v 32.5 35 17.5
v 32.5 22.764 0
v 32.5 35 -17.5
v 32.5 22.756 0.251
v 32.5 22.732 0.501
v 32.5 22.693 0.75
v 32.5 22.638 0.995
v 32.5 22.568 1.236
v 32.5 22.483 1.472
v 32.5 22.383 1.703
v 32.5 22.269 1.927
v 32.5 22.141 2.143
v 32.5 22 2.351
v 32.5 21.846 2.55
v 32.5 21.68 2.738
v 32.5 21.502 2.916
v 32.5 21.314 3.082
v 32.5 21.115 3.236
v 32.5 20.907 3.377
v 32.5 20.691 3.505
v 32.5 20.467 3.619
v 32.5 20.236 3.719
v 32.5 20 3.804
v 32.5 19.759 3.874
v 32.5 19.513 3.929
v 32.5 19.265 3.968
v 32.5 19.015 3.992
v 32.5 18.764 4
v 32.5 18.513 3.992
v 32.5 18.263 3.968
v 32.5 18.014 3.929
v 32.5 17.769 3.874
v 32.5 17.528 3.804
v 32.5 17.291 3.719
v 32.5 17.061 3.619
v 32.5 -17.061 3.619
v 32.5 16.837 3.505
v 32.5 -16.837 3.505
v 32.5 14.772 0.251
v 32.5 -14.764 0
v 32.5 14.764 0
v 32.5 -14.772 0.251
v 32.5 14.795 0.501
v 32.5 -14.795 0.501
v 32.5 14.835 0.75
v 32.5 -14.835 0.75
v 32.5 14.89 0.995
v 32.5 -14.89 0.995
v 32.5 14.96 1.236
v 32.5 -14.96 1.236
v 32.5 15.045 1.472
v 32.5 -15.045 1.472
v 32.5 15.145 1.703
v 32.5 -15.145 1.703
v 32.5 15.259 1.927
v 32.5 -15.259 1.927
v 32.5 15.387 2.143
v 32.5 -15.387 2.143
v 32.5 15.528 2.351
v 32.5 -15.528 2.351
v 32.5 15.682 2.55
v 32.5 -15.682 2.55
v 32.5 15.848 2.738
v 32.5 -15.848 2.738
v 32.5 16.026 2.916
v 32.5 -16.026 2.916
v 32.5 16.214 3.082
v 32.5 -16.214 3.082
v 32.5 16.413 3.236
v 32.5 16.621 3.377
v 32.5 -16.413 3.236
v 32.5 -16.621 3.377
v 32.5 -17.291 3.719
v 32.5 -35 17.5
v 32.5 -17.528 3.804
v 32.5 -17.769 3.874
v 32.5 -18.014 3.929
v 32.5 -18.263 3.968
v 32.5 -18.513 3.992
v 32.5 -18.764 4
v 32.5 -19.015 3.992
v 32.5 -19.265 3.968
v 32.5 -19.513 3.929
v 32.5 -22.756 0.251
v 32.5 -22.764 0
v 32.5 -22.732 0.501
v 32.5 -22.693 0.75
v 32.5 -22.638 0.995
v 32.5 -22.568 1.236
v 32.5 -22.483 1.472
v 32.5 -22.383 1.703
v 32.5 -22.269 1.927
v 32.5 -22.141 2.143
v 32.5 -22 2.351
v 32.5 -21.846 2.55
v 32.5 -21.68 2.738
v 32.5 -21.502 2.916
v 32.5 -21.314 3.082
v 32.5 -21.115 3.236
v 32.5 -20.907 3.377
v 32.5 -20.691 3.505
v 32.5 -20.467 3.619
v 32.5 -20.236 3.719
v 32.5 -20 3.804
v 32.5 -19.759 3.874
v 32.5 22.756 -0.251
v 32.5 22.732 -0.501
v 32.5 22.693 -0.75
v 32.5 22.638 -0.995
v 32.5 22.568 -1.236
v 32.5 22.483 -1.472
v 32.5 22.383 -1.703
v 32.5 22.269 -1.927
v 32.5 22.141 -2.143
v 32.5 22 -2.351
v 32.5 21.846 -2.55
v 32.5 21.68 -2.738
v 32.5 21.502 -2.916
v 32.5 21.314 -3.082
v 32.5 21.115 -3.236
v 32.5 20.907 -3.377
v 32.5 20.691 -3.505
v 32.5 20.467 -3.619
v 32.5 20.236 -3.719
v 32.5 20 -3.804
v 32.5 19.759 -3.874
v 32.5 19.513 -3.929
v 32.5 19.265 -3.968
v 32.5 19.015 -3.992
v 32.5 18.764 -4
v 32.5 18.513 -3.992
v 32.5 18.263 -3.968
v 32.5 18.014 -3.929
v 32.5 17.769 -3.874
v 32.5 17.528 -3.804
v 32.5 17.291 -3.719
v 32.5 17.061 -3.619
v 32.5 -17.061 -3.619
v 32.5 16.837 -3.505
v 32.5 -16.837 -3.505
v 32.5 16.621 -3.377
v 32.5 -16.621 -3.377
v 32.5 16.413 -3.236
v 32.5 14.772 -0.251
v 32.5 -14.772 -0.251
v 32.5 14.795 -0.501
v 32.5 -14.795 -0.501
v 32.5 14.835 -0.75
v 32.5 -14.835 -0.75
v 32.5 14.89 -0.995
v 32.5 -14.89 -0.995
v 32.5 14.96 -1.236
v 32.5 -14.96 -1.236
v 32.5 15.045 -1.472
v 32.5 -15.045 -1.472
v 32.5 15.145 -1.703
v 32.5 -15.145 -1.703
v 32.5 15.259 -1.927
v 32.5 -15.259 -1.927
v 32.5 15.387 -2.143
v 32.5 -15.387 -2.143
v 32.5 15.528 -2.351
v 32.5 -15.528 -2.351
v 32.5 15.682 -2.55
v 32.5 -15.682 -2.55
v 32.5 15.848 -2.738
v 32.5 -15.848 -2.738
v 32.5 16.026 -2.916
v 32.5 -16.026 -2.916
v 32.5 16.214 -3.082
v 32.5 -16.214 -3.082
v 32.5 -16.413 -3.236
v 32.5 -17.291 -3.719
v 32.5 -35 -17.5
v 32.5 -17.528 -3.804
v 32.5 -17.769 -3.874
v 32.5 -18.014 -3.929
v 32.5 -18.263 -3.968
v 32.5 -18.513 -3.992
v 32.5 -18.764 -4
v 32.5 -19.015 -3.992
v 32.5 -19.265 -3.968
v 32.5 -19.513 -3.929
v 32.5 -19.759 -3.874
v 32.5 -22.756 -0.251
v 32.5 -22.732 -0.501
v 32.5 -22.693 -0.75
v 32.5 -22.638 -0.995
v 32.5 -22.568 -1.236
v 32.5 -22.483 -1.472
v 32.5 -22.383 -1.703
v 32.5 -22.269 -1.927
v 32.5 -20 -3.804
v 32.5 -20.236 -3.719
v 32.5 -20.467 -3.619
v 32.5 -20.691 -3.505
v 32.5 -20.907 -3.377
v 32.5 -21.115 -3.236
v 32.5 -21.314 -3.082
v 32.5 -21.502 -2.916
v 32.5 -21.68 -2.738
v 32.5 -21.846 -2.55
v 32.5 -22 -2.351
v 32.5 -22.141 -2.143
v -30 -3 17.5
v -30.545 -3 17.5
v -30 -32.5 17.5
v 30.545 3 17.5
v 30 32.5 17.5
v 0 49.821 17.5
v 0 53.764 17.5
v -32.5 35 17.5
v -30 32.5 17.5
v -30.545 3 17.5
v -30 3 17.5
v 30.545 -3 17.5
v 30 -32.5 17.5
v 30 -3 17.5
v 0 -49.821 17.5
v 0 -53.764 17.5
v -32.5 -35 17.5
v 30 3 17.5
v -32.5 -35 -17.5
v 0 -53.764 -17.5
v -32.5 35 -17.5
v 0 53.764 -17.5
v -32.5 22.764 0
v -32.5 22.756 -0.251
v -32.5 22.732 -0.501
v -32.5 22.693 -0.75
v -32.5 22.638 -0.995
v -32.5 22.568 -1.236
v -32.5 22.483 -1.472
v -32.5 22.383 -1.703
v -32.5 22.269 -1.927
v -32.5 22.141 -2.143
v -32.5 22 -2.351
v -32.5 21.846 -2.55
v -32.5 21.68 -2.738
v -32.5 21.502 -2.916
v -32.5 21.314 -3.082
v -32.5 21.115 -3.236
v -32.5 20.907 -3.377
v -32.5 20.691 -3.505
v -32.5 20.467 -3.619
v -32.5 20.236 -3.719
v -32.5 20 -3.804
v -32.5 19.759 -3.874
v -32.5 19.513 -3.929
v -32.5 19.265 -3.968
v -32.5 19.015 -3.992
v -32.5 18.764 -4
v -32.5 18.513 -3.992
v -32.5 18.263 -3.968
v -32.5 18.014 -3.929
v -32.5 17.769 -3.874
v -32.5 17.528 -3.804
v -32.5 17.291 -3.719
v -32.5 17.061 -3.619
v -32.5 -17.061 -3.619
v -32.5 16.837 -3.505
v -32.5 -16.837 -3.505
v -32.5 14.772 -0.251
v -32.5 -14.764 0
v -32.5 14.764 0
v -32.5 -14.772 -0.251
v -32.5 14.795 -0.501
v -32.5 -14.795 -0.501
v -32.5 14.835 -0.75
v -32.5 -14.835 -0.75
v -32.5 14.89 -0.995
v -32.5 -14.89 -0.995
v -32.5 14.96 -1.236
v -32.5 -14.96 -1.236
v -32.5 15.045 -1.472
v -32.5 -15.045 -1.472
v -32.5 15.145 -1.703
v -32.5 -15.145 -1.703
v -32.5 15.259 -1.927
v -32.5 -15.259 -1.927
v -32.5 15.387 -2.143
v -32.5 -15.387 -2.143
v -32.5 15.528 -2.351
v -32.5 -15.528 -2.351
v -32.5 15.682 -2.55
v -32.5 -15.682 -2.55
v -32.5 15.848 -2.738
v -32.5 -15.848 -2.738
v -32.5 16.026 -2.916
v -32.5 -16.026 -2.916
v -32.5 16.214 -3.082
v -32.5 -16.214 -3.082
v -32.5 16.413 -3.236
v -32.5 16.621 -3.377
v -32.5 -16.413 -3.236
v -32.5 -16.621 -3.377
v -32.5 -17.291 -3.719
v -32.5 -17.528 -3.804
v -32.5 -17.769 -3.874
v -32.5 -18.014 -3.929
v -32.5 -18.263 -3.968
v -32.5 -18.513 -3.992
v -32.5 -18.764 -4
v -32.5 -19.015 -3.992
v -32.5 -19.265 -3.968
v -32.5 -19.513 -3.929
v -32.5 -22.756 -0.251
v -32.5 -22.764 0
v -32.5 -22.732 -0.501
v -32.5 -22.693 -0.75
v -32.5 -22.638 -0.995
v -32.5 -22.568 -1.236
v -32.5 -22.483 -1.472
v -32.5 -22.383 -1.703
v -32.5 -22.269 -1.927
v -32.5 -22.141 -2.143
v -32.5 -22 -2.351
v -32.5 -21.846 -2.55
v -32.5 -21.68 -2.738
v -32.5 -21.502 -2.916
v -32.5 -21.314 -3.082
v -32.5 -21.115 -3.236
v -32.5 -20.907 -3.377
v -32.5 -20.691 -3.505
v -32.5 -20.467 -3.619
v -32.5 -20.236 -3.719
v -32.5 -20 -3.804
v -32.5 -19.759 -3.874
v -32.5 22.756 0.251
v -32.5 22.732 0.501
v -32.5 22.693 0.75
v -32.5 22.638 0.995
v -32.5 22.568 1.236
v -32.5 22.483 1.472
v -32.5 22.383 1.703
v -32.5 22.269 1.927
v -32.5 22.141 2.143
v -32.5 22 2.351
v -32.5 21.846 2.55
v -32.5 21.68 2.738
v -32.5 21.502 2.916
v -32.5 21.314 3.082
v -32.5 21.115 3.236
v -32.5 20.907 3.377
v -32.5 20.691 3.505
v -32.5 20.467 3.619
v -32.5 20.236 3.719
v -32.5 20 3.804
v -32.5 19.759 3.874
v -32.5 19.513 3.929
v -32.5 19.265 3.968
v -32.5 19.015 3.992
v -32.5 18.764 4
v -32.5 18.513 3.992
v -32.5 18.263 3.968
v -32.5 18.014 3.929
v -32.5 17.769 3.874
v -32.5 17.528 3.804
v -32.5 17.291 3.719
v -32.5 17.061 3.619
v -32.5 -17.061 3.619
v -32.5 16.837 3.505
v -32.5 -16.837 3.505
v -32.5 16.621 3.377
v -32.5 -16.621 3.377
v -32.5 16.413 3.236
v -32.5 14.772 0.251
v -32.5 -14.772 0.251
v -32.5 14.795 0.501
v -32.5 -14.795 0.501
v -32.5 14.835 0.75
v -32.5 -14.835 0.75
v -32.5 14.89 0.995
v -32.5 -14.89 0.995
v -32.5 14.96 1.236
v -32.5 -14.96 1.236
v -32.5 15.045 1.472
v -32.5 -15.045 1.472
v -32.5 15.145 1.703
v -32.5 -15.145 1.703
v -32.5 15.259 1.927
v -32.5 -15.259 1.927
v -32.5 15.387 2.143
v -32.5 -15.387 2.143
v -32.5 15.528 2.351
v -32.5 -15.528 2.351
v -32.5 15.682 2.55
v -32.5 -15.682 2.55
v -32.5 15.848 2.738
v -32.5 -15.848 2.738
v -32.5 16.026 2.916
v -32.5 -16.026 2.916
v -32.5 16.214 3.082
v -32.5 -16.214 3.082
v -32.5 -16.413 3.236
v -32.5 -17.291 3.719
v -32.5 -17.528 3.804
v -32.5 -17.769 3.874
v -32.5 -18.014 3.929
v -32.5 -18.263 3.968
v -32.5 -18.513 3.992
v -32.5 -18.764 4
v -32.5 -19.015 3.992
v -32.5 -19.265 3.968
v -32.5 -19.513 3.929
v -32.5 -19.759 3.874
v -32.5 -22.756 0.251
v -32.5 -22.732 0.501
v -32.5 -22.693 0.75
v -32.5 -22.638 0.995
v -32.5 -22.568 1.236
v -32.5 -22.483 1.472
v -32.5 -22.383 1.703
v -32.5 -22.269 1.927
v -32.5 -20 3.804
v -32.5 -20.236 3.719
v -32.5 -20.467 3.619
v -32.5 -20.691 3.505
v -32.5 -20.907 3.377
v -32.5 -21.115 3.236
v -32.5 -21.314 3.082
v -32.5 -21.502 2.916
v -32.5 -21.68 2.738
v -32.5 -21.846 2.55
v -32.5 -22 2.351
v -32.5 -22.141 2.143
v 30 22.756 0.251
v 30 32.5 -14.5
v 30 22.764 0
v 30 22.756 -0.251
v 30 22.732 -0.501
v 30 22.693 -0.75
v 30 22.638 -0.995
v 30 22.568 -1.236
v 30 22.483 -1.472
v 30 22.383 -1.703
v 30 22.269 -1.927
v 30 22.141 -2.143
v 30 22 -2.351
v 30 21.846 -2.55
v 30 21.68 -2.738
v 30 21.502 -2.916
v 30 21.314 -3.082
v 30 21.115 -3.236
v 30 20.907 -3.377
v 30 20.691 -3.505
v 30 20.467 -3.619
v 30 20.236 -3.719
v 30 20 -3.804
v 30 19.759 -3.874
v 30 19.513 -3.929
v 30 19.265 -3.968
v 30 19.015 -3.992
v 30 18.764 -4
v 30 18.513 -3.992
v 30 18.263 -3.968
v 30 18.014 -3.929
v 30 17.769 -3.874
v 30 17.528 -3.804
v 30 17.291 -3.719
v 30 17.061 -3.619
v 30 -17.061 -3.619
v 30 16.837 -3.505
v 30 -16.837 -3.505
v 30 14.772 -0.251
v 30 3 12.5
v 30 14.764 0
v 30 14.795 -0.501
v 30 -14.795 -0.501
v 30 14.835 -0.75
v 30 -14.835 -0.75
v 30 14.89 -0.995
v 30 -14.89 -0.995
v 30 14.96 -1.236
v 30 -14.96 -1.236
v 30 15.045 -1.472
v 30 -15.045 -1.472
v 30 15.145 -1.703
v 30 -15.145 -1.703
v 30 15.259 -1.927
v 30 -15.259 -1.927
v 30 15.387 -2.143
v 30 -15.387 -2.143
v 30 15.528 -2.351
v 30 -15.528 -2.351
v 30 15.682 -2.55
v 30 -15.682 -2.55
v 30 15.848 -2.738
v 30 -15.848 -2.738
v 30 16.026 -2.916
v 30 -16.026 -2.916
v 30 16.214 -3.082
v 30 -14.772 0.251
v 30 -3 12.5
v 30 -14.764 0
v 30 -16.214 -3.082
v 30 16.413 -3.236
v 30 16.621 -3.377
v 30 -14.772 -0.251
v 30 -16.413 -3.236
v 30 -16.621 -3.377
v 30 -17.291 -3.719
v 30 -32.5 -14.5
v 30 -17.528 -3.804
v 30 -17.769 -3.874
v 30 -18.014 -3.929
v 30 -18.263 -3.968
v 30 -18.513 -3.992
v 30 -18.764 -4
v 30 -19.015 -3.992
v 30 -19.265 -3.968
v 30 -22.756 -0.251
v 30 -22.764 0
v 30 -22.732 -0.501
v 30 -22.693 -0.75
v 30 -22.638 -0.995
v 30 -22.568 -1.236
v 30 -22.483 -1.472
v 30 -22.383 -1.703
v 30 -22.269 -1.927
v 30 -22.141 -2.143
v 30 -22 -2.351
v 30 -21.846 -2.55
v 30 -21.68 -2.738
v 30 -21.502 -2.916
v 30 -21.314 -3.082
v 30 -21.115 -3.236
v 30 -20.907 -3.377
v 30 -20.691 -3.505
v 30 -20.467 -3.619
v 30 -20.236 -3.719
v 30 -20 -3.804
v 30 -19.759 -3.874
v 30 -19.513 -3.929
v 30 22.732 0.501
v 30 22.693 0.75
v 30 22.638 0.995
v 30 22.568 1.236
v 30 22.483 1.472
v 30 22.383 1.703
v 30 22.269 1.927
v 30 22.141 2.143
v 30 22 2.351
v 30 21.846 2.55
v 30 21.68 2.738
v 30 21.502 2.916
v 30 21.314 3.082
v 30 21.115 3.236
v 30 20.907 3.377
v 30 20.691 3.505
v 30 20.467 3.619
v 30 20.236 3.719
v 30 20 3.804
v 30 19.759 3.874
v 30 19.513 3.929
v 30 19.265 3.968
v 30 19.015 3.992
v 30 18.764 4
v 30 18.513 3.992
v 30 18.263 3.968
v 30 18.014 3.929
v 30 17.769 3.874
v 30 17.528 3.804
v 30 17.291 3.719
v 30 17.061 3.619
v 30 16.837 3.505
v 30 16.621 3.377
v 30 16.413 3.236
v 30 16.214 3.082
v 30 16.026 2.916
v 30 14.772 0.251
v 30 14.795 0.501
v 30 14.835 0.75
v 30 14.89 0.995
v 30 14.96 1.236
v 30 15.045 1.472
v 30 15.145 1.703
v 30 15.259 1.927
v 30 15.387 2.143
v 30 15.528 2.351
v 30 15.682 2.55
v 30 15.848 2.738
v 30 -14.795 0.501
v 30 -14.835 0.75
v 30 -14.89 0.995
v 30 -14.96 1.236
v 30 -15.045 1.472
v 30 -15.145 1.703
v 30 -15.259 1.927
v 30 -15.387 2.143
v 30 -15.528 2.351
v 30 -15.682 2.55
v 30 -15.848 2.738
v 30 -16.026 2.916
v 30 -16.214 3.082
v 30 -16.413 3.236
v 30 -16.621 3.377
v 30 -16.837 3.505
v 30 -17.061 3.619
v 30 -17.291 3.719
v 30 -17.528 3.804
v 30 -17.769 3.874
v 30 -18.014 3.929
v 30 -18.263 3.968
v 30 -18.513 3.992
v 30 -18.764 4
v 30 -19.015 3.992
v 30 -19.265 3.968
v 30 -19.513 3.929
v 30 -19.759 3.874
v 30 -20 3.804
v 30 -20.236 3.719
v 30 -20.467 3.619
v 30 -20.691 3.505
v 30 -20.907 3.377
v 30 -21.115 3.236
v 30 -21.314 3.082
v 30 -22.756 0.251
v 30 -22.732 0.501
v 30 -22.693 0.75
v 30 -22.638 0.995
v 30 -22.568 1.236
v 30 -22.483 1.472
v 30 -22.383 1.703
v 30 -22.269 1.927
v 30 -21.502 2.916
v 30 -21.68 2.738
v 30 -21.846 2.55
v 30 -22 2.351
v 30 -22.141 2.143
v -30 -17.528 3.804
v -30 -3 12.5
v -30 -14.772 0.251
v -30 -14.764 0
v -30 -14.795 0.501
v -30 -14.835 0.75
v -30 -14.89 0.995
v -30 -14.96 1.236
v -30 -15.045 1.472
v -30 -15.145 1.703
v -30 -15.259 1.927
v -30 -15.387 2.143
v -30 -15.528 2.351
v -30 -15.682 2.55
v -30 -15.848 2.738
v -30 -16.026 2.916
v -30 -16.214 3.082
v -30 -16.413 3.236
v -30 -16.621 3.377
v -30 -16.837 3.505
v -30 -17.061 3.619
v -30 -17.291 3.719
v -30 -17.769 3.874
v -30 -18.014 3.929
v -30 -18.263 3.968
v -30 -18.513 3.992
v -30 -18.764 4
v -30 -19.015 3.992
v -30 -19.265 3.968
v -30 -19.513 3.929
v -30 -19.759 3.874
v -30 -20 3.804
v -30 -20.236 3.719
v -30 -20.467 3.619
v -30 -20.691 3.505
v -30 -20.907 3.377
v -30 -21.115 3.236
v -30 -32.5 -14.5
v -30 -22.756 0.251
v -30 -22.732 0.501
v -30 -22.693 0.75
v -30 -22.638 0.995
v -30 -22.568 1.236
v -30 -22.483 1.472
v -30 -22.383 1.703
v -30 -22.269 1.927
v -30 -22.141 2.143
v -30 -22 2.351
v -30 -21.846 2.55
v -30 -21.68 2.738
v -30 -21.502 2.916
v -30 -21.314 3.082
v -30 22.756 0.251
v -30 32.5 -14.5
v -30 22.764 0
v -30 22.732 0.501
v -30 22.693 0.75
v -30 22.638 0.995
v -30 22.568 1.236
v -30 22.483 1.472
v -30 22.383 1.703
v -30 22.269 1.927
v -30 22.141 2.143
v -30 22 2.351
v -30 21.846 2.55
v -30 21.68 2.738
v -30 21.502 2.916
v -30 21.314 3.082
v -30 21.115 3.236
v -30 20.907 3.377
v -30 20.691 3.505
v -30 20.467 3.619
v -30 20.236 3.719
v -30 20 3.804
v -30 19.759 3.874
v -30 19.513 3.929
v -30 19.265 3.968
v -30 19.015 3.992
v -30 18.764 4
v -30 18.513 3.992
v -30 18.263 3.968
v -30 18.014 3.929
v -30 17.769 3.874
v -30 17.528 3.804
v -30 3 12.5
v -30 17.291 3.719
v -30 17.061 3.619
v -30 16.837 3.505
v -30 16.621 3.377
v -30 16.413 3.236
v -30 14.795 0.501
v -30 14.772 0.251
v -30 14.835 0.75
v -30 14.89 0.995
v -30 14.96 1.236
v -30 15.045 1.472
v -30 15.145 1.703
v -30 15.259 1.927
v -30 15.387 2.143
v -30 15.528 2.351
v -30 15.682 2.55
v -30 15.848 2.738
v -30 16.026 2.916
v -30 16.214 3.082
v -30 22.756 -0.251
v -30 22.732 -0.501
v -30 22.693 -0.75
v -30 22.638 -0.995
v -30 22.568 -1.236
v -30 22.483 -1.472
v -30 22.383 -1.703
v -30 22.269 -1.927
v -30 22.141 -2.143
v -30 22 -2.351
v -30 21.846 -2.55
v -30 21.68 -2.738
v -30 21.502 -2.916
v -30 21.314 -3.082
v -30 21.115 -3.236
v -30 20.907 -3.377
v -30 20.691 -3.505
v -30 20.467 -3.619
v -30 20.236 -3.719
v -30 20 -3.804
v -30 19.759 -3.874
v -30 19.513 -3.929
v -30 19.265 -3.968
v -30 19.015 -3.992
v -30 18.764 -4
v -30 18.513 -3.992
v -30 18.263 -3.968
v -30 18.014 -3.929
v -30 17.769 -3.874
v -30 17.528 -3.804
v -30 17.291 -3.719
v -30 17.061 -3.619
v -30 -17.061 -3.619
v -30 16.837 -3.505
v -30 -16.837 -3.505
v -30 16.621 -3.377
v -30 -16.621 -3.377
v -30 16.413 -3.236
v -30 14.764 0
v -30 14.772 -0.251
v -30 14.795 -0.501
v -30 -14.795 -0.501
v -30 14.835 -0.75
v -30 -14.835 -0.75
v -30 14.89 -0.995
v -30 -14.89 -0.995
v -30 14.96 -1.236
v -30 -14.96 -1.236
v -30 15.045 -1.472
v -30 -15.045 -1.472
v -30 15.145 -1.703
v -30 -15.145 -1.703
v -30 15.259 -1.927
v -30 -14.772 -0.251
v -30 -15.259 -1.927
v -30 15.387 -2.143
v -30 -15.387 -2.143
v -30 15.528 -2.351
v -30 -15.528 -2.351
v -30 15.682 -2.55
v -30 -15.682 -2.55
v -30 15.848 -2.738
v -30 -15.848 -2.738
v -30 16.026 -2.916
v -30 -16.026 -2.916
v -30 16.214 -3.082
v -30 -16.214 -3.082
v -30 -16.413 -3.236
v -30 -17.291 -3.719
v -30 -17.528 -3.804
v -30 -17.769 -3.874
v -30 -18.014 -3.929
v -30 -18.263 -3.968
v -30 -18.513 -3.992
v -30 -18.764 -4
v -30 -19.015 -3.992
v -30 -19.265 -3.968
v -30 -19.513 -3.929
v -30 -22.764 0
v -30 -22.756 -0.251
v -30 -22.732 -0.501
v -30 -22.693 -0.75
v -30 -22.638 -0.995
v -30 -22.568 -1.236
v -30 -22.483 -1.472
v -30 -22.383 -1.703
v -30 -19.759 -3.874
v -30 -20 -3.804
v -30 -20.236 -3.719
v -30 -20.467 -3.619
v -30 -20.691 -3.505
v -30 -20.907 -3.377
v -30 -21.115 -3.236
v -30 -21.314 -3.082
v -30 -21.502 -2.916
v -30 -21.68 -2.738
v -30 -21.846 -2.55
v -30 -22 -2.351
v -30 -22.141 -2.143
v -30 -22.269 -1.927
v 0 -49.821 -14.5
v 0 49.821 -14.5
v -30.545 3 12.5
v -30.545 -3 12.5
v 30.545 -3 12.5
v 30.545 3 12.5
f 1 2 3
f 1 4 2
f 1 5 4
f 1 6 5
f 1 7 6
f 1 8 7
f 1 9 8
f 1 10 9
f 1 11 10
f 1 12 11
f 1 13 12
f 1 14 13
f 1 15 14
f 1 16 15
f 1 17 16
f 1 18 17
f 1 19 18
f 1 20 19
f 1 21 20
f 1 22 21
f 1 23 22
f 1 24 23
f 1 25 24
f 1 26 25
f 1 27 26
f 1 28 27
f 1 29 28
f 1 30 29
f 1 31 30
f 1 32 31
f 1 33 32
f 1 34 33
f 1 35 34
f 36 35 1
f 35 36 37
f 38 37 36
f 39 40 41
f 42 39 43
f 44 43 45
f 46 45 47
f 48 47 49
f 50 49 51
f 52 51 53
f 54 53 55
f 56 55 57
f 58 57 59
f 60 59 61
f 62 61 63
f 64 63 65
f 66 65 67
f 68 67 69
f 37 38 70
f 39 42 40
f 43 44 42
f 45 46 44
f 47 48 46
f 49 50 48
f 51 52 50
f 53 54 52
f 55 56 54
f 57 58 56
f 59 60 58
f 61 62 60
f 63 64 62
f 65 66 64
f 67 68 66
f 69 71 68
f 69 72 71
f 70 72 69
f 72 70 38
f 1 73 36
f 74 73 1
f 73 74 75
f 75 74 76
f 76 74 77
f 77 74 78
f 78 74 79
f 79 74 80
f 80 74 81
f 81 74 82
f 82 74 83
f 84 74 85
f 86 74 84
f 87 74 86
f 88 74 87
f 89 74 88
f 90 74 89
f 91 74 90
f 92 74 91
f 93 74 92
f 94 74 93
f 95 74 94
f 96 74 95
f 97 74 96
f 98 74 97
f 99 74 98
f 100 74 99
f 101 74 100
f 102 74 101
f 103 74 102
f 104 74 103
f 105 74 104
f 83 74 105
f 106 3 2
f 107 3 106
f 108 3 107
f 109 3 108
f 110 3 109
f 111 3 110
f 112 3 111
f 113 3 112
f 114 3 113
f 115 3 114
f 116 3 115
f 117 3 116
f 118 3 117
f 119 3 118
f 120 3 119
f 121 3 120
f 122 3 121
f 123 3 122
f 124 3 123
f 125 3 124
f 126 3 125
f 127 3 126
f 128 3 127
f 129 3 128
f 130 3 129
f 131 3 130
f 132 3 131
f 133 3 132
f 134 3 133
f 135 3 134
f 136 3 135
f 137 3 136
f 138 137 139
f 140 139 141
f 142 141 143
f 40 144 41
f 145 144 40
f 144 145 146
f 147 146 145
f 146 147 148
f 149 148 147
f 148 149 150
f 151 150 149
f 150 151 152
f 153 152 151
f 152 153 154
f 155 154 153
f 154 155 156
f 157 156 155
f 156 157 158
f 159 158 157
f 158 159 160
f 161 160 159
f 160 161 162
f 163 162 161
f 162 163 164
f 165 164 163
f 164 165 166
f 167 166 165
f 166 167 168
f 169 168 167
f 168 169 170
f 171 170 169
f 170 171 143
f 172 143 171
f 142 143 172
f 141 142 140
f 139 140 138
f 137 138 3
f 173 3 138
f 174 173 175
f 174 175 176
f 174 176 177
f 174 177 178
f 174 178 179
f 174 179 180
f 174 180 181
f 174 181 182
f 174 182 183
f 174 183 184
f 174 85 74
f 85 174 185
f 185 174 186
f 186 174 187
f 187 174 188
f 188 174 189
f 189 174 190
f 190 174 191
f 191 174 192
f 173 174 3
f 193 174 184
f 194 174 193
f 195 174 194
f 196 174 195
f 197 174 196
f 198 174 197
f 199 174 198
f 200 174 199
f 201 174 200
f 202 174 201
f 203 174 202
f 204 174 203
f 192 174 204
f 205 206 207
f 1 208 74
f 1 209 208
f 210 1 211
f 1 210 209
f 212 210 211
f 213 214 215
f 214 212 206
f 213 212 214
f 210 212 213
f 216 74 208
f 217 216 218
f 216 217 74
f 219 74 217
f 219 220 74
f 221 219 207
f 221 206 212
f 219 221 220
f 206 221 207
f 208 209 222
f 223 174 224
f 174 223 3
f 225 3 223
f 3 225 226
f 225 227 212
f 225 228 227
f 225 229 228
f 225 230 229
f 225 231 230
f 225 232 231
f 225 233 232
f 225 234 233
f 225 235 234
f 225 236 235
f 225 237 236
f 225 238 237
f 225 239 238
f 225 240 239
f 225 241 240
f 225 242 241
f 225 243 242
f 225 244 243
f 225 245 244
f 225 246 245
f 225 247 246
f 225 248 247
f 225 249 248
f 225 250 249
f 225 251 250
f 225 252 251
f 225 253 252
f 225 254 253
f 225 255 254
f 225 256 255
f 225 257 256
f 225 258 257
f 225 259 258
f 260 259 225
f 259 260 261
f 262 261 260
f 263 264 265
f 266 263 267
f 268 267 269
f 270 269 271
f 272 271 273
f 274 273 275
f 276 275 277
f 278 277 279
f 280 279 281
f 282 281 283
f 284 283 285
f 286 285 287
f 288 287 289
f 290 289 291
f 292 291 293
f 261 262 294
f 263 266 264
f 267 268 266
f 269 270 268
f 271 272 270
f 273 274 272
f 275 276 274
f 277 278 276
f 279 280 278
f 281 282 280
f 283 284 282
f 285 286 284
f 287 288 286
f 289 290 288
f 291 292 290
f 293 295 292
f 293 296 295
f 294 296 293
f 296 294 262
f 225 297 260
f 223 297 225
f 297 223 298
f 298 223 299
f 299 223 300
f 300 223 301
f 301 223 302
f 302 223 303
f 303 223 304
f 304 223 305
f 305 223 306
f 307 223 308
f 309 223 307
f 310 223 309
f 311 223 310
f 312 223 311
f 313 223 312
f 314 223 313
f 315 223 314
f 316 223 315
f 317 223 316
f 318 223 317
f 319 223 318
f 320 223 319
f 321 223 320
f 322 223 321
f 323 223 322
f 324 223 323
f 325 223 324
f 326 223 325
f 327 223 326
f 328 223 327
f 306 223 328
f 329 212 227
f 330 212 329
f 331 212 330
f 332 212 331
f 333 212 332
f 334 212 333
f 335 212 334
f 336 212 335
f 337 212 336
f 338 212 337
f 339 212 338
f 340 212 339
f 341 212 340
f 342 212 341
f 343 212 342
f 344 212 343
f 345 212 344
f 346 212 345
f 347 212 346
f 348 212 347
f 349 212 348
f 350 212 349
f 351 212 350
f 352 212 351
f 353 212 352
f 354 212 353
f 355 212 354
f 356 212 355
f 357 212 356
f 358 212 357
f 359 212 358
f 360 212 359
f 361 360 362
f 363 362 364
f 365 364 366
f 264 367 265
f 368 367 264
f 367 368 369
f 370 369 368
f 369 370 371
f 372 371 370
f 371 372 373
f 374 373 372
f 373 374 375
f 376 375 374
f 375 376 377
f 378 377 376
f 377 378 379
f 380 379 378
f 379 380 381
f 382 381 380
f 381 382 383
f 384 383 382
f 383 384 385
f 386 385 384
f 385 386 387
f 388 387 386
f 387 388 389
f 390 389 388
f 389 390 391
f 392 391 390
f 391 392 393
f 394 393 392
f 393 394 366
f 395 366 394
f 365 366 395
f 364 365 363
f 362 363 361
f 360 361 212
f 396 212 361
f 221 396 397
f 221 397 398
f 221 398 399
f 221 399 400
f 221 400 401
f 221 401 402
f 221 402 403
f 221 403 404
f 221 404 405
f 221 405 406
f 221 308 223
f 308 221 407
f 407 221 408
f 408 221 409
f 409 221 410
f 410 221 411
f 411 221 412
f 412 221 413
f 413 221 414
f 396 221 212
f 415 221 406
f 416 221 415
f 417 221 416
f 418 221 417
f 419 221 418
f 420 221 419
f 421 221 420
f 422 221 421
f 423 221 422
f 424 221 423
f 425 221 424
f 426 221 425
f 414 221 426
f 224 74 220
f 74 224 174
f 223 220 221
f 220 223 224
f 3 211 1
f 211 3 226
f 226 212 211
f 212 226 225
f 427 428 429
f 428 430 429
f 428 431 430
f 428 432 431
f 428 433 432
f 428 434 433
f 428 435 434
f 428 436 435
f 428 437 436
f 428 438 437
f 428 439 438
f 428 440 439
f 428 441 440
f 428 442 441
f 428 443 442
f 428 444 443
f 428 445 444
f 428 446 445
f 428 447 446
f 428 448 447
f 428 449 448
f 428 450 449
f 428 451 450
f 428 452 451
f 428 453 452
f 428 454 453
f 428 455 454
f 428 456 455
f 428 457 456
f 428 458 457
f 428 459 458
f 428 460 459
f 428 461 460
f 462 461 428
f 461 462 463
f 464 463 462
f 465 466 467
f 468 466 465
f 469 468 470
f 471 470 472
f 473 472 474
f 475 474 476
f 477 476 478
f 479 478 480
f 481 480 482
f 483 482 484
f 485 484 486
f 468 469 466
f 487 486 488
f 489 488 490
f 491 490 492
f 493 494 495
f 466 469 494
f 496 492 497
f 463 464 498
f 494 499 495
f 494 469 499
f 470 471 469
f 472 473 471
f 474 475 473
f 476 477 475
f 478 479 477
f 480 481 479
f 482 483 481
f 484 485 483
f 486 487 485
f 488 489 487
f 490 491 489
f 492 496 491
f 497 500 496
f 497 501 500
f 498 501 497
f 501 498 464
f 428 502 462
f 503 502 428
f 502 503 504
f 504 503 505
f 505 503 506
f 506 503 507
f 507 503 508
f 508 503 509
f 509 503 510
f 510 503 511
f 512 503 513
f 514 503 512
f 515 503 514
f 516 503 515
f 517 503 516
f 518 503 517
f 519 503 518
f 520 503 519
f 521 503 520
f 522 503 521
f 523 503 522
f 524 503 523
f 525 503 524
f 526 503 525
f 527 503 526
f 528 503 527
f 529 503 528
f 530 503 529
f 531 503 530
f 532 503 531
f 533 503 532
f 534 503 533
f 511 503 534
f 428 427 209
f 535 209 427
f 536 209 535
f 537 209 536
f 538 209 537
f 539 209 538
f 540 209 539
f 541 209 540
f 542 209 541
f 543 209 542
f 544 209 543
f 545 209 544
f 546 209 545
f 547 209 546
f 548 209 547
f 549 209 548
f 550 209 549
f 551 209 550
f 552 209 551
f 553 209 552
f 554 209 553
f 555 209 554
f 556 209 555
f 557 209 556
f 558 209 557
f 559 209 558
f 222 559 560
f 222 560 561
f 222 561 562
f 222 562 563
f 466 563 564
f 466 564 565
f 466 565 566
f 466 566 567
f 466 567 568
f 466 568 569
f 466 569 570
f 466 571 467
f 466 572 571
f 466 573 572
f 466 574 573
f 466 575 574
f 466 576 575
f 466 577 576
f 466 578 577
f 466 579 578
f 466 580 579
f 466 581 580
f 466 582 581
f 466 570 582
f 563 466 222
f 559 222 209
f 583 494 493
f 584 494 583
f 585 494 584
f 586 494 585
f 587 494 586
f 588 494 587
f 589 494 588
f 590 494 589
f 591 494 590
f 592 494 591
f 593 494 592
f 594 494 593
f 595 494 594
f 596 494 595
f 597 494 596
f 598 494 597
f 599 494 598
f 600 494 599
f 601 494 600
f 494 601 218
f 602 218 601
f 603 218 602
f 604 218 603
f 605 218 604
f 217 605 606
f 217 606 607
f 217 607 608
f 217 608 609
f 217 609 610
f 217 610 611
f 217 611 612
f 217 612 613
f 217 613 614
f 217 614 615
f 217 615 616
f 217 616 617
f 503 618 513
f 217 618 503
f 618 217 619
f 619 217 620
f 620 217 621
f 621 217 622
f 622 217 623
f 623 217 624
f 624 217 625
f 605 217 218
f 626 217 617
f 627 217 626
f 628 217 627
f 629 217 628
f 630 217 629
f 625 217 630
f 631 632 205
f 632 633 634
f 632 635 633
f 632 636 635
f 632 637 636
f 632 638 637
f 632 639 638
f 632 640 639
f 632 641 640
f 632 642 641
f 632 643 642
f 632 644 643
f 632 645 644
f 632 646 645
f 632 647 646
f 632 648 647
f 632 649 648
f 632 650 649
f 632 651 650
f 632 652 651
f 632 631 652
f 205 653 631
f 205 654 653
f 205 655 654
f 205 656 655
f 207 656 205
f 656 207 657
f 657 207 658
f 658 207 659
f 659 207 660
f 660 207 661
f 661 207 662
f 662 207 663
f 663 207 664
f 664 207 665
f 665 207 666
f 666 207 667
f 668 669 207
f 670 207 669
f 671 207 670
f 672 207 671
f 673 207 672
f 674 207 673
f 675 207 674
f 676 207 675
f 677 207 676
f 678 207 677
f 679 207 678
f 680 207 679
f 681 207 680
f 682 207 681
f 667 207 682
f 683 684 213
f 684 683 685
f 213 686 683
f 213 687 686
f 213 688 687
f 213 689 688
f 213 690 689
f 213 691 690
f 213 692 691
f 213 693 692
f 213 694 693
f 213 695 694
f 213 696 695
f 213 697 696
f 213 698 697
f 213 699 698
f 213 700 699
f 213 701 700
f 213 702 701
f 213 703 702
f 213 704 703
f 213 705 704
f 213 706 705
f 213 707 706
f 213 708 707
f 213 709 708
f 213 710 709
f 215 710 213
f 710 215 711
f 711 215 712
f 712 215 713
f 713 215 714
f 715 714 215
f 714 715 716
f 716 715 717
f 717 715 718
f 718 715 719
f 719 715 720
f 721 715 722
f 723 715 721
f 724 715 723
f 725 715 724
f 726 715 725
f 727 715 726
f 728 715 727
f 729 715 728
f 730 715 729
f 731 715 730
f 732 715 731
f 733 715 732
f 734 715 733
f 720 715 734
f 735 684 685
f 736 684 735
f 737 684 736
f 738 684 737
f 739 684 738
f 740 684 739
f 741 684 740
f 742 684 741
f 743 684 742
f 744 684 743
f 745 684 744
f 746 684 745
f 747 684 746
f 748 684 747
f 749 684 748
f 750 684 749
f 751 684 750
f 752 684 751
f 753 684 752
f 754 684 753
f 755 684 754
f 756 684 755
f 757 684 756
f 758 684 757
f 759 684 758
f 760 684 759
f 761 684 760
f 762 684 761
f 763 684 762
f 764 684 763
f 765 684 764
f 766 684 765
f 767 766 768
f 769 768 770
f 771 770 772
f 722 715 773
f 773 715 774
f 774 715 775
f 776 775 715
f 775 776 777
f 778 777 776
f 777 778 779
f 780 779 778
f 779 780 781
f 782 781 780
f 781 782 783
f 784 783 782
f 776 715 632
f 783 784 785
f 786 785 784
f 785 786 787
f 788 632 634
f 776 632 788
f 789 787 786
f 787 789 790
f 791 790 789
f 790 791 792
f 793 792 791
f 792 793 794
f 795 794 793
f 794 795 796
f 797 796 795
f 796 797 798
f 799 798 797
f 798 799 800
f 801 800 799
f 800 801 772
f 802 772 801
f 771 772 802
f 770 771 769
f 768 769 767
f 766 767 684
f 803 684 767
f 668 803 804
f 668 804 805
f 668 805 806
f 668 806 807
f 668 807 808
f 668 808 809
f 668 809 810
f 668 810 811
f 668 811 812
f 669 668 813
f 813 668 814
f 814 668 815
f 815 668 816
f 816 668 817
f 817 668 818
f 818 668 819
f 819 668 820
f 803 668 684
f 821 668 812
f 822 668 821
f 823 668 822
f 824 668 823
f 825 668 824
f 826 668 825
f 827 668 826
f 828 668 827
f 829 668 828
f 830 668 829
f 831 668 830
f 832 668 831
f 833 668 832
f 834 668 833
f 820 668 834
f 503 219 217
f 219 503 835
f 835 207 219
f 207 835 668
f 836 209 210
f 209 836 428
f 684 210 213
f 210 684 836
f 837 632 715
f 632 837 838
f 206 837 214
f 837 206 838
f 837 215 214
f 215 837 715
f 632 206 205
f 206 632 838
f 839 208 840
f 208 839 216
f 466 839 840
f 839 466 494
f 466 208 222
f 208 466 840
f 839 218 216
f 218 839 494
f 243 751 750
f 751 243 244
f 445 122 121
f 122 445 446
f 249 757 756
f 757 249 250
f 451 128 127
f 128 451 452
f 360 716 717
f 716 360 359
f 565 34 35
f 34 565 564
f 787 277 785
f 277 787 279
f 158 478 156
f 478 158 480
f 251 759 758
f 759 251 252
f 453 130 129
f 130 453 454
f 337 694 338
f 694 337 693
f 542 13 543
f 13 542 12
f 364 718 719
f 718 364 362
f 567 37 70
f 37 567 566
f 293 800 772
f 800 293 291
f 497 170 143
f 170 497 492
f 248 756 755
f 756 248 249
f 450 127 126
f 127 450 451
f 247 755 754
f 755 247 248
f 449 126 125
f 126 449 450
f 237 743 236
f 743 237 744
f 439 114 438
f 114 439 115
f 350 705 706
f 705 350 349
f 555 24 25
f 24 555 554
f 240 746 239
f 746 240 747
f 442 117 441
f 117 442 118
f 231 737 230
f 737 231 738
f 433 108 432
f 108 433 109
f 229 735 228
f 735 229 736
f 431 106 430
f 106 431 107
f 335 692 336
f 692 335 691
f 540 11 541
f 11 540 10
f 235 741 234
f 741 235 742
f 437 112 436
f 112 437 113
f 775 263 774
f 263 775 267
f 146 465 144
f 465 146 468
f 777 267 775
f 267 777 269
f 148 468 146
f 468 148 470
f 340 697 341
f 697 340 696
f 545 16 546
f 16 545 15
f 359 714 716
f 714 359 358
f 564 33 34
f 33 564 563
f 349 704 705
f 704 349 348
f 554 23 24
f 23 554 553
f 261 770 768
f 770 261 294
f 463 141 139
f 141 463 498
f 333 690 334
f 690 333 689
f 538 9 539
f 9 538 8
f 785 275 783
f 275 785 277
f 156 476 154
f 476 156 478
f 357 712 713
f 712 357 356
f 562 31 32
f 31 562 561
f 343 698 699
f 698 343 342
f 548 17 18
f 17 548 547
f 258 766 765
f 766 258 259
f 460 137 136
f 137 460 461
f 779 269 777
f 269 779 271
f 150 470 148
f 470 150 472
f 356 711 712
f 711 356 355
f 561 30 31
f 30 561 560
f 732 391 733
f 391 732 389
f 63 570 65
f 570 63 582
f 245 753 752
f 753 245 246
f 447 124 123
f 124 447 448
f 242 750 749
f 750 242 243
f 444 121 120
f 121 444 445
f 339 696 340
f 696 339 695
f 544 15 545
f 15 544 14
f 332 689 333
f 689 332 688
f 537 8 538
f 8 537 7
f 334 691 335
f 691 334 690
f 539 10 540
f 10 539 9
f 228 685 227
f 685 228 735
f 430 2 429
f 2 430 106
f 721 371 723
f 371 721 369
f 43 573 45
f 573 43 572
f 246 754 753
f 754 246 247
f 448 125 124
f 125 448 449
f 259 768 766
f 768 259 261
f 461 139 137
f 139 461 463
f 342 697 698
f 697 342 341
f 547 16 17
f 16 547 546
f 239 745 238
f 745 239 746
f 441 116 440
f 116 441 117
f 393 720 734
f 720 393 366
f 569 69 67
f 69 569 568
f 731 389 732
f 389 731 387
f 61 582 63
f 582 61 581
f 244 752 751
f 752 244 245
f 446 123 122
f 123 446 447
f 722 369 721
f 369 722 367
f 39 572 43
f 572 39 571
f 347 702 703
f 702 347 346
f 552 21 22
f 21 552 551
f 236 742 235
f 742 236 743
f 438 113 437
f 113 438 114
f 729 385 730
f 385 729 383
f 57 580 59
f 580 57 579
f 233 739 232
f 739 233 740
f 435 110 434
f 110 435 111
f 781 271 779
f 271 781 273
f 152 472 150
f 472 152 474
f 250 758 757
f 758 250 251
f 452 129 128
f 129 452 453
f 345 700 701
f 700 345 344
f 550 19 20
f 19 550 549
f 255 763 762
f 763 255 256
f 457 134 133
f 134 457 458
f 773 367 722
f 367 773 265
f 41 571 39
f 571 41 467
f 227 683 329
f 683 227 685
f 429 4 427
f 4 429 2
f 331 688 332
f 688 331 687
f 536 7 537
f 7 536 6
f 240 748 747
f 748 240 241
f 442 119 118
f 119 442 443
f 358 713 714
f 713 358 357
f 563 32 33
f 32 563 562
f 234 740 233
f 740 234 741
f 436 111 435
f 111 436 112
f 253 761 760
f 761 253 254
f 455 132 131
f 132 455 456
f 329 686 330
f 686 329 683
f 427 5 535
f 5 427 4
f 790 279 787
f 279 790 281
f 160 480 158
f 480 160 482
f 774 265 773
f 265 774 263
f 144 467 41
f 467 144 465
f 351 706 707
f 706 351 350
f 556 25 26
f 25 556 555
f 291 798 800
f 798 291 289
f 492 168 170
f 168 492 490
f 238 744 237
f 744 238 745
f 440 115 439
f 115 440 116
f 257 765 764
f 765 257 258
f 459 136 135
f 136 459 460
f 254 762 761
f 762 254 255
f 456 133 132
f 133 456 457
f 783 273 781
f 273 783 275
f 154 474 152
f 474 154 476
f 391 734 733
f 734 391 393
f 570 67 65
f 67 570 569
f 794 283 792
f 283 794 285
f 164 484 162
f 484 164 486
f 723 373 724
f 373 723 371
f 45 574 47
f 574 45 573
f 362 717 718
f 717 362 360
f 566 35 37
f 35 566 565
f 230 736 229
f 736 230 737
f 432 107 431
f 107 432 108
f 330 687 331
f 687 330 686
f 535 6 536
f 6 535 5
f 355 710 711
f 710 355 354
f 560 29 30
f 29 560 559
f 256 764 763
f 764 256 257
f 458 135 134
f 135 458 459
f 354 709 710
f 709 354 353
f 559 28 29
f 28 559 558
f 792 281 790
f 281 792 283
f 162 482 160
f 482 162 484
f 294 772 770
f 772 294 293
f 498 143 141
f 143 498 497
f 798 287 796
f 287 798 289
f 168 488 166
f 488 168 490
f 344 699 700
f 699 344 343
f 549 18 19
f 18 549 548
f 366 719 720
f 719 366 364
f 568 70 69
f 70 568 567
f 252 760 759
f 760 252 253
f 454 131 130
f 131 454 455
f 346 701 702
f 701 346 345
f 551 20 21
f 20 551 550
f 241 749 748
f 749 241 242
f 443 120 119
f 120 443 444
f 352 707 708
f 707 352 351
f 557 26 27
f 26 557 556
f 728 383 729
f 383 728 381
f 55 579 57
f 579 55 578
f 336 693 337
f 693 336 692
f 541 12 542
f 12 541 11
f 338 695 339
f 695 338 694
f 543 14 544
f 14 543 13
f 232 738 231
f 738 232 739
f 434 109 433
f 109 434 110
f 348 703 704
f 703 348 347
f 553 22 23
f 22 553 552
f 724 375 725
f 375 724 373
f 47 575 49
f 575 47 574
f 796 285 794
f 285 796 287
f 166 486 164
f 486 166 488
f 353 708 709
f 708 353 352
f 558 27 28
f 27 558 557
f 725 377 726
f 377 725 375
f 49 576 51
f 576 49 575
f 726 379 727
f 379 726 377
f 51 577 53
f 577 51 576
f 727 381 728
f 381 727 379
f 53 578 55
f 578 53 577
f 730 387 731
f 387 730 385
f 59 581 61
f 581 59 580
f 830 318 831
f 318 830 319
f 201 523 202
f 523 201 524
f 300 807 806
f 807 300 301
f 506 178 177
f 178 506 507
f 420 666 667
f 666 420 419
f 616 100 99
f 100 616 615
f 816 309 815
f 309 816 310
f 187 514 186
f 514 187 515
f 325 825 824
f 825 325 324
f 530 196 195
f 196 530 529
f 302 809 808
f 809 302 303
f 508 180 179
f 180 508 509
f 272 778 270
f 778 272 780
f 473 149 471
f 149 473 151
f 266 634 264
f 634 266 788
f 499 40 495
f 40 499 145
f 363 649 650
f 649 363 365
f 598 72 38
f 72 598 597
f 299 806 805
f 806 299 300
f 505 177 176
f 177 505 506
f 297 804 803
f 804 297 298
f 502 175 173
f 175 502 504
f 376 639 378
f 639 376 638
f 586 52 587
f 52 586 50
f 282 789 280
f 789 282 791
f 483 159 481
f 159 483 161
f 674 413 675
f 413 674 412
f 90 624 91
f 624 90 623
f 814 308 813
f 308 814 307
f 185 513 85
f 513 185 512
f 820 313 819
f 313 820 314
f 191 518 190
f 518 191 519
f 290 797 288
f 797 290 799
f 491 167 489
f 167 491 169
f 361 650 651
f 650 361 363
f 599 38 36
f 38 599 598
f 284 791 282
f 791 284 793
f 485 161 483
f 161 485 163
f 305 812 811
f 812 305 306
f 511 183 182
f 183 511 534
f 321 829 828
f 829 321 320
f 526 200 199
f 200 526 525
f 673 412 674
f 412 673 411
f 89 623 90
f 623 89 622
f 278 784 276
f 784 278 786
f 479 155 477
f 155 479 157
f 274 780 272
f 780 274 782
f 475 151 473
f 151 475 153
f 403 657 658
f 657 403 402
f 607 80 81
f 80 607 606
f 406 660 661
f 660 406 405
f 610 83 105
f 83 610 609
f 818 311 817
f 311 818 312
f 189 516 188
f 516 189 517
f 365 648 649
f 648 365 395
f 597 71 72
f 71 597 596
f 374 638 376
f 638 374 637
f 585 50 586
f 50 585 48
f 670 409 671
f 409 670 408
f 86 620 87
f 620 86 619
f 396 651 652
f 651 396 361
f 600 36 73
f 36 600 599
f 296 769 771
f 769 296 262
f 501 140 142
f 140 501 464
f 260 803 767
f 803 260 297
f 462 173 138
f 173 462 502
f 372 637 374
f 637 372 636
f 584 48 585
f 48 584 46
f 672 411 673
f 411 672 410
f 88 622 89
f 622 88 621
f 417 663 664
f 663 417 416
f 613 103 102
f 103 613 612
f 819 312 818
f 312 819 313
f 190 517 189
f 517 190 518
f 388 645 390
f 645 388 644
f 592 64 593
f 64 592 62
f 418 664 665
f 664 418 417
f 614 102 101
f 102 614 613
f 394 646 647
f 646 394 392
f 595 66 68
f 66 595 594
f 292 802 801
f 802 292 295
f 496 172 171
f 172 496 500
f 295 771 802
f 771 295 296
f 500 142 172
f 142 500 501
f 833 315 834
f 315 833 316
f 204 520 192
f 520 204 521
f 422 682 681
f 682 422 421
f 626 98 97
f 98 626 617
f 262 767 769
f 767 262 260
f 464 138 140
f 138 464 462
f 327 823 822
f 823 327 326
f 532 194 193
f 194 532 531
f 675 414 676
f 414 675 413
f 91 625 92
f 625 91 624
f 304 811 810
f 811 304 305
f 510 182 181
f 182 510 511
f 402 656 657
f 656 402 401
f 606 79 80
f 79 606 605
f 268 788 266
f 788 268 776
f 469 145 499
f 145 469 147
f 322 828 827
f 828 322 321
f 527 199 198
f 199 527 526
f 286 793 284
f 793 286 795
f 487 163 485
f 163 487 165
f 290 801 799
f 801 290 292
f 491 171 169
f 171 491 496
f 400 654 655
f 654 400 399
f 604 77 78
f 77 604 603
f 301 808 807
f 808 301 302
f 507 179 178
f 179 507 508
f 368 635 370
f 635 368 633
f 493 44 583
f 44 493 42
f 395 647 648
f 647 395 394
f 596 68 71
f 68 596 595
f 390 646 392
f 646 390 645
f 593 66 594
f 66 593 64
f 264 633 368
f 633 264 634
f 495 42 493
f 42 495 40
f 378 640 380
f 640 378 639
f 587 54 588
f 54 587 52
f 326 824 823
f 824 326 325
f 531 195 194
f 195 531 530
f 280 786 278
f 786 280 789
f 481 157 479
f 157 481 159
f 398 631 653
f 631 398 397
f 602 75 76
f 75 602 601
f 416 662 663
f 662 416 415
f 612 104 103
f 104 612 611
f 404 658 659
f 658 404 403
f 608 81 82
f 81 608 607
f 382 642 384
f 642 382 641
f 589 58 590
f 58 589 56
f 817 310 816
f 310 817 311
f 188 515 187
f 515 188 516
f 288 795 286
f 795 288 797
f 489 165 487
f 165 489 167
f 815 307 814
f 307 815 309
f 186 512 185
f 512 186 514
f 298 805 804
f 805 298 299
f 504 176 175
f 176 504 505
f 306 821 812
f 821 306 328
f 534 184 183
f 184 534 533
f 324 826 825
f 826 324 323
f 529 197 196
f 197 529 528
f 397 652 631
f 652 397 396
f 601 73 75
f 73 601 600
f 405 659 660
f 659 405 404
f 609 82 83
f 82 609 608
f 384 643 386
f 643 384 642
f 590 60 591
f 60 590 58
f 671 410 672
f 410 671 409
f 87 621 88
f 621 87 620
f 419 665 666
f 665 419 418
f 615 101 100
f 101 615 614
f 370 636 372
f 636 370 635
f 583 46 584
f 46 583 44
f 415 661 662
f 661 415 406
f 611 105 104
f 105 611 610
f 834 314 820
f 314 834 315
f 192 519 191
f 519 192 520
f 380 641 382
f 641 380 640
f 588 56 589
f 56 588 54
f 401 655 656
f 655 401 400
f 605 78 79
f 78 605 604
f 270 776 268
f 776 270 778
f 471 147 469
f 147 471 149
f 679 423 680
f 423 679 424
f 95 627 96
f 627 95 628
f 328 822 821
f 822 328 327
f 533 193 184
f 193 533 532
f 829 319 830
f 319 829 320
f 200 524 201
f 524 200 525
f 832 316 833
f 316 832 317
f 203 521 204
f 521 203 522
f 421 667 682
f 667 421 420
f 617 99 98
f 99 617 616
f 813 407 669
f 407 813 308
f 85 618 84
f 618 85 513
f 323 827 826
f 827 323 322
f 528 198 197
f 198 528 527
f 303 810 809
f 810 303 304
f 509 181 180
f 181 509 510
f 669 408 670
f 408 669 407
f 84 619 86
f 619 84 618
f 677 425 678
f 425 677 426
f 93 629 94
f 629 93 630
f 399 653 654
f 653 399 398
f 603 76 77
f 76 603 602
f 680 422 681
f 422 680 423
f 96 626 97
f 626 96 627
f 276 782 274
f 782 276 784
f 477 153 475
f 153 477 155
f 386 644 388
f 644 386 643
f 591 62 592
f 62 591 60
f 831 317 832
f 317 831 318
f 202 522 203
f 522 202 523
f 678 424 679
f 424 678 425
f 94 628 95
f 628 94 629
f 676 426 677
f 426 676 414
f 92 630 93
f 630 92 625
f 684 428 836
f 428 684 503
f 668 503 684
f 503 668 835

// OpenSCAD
$fn = 100;

// Functions for calculating the half-hexagons
function edge_length(width) = (width/2) / cos(30); // CAH
function point_height(width) = (width/2) * tan(30); // TOA
function leg(width) = edge_length(width) * sqrt(1/2);
function x_offset(width) = (width/2) - leg(width) * cos(15);
function y_offset(width, length) = length/2 - (leg(width) * sin(15));

// Core size variables
scaling = 1;
lip = 0;
h = (35 + lip) * scaling;
w = (65) * scaling;
l = (70) * scaling;

// Values for interior space
h_pad = -1;
w_pad = 5;
l_pad = 5;

difference(){
// The exterior shape
union(){
cube([w, l, h], center=true); // Center Cube
translate([x_offset(w),-y_offset(w,l),0]){
	rotate([0,0,30]) cube([edge_length(w),edge_length(w),h], center=true);
}
translate([-x_offset(w),-y_offset(w,l),0]){
	rotate([0,0,-30]) cube([edge_length(w),edge_length(w),h], center=true);
}

translate([x_offset(w),y_offset(w,l),0]){
	rotate([0,0,-30]) cube([edge_length(w),edge_length(w),h], center=true);
}
translate([-x_offset(w),y_offset(w,l),0]){
	rotate([0,0,30]) cube([edge_length(w),edge_length(w),h], center=true);
}}

// The teeth
translate([-w/2.2,0,h/2]){cube([2, 6, 10], center=true);}
translate([w/2.2,0,h/2]){cube([2, 6, 10], center=true);}

translate([0,point_height(w),lip]){rotate([0,90]) cylinder(h=100, r=4, center=true);}
translate([0,-point_height(w),lip]){rotate([0,90]) cylinder(h=100, r=4, center=true);}


// The interior shape
translate([0,0,0]){
union(){
cube([w-w_pad, l-l_pad, h-h_pad], center=true); // Center Cube
translate([x_offset(w-w_pad),-y_offset(w-w_pad,l-l_pad),0]){
	rotate([0,0,30]) cube([edge_length(w-w_pad),edge_length(w-w_pad),h-h_pad], center=true);
}
translate([-x_offset(w-w_pad),-y_offset(w-w_pad,l-l_pad),0]){
	rotate([0,0,-30]) cube([edge_length(w-w_pad),edge_length(w-w_pad),h-h_pad], center=true);
}

translate([x_offset(w-w_pad),y_offset(w-w_pad,l-l_pad),0]){
	rotate([0,0,-30]) cube([edge_length(w-w_pad),edge_length(w-w_pad),h-h_pad], center=true);
}
translate([-x_offset(w-w_pad),y_offset(w-w_pad,l-l_pad),0]){
	rotate([0,0,30]) cube([edge_length(w-w_pad),edge_length(w-w_pad),h-h_pad], center=true);
}}}}

// The floor of the case
translate([0,0,-(h/2)+(h_lid/2)+lip]){
union(){
cube([w, l, h_lid], center=true); // Center Cube
translate([x_offset(w),-y_offset(w,l),0]){
	rotate([0,0,30]) cube([edge_length(w),edge_length(w),h_lid], center=true);
}
translate([-x_offset(w),-y_offset(w,l),0]){
	rotate([0,0,-30]) cube([edge_length(w),edge_length(w),h_lid], center=true);
}

translate([x_offset(w),y_offset(w,l),0]){
	rotate([0,0,-30]) cube([edge_length(w),edge_length(w),h_lid], center=true);
}
translate([-x_offset(w),y_offset(w,l),0]){
	rotate([0,0,30]) cube([edge_length(w),edge_length(w),h_lid], center=true);
}}}


// The lid
h_lid = 3;
function hex_len(width) = 2 * (cos(30) * width);
hex_edge = edge_length(w/1.6);
